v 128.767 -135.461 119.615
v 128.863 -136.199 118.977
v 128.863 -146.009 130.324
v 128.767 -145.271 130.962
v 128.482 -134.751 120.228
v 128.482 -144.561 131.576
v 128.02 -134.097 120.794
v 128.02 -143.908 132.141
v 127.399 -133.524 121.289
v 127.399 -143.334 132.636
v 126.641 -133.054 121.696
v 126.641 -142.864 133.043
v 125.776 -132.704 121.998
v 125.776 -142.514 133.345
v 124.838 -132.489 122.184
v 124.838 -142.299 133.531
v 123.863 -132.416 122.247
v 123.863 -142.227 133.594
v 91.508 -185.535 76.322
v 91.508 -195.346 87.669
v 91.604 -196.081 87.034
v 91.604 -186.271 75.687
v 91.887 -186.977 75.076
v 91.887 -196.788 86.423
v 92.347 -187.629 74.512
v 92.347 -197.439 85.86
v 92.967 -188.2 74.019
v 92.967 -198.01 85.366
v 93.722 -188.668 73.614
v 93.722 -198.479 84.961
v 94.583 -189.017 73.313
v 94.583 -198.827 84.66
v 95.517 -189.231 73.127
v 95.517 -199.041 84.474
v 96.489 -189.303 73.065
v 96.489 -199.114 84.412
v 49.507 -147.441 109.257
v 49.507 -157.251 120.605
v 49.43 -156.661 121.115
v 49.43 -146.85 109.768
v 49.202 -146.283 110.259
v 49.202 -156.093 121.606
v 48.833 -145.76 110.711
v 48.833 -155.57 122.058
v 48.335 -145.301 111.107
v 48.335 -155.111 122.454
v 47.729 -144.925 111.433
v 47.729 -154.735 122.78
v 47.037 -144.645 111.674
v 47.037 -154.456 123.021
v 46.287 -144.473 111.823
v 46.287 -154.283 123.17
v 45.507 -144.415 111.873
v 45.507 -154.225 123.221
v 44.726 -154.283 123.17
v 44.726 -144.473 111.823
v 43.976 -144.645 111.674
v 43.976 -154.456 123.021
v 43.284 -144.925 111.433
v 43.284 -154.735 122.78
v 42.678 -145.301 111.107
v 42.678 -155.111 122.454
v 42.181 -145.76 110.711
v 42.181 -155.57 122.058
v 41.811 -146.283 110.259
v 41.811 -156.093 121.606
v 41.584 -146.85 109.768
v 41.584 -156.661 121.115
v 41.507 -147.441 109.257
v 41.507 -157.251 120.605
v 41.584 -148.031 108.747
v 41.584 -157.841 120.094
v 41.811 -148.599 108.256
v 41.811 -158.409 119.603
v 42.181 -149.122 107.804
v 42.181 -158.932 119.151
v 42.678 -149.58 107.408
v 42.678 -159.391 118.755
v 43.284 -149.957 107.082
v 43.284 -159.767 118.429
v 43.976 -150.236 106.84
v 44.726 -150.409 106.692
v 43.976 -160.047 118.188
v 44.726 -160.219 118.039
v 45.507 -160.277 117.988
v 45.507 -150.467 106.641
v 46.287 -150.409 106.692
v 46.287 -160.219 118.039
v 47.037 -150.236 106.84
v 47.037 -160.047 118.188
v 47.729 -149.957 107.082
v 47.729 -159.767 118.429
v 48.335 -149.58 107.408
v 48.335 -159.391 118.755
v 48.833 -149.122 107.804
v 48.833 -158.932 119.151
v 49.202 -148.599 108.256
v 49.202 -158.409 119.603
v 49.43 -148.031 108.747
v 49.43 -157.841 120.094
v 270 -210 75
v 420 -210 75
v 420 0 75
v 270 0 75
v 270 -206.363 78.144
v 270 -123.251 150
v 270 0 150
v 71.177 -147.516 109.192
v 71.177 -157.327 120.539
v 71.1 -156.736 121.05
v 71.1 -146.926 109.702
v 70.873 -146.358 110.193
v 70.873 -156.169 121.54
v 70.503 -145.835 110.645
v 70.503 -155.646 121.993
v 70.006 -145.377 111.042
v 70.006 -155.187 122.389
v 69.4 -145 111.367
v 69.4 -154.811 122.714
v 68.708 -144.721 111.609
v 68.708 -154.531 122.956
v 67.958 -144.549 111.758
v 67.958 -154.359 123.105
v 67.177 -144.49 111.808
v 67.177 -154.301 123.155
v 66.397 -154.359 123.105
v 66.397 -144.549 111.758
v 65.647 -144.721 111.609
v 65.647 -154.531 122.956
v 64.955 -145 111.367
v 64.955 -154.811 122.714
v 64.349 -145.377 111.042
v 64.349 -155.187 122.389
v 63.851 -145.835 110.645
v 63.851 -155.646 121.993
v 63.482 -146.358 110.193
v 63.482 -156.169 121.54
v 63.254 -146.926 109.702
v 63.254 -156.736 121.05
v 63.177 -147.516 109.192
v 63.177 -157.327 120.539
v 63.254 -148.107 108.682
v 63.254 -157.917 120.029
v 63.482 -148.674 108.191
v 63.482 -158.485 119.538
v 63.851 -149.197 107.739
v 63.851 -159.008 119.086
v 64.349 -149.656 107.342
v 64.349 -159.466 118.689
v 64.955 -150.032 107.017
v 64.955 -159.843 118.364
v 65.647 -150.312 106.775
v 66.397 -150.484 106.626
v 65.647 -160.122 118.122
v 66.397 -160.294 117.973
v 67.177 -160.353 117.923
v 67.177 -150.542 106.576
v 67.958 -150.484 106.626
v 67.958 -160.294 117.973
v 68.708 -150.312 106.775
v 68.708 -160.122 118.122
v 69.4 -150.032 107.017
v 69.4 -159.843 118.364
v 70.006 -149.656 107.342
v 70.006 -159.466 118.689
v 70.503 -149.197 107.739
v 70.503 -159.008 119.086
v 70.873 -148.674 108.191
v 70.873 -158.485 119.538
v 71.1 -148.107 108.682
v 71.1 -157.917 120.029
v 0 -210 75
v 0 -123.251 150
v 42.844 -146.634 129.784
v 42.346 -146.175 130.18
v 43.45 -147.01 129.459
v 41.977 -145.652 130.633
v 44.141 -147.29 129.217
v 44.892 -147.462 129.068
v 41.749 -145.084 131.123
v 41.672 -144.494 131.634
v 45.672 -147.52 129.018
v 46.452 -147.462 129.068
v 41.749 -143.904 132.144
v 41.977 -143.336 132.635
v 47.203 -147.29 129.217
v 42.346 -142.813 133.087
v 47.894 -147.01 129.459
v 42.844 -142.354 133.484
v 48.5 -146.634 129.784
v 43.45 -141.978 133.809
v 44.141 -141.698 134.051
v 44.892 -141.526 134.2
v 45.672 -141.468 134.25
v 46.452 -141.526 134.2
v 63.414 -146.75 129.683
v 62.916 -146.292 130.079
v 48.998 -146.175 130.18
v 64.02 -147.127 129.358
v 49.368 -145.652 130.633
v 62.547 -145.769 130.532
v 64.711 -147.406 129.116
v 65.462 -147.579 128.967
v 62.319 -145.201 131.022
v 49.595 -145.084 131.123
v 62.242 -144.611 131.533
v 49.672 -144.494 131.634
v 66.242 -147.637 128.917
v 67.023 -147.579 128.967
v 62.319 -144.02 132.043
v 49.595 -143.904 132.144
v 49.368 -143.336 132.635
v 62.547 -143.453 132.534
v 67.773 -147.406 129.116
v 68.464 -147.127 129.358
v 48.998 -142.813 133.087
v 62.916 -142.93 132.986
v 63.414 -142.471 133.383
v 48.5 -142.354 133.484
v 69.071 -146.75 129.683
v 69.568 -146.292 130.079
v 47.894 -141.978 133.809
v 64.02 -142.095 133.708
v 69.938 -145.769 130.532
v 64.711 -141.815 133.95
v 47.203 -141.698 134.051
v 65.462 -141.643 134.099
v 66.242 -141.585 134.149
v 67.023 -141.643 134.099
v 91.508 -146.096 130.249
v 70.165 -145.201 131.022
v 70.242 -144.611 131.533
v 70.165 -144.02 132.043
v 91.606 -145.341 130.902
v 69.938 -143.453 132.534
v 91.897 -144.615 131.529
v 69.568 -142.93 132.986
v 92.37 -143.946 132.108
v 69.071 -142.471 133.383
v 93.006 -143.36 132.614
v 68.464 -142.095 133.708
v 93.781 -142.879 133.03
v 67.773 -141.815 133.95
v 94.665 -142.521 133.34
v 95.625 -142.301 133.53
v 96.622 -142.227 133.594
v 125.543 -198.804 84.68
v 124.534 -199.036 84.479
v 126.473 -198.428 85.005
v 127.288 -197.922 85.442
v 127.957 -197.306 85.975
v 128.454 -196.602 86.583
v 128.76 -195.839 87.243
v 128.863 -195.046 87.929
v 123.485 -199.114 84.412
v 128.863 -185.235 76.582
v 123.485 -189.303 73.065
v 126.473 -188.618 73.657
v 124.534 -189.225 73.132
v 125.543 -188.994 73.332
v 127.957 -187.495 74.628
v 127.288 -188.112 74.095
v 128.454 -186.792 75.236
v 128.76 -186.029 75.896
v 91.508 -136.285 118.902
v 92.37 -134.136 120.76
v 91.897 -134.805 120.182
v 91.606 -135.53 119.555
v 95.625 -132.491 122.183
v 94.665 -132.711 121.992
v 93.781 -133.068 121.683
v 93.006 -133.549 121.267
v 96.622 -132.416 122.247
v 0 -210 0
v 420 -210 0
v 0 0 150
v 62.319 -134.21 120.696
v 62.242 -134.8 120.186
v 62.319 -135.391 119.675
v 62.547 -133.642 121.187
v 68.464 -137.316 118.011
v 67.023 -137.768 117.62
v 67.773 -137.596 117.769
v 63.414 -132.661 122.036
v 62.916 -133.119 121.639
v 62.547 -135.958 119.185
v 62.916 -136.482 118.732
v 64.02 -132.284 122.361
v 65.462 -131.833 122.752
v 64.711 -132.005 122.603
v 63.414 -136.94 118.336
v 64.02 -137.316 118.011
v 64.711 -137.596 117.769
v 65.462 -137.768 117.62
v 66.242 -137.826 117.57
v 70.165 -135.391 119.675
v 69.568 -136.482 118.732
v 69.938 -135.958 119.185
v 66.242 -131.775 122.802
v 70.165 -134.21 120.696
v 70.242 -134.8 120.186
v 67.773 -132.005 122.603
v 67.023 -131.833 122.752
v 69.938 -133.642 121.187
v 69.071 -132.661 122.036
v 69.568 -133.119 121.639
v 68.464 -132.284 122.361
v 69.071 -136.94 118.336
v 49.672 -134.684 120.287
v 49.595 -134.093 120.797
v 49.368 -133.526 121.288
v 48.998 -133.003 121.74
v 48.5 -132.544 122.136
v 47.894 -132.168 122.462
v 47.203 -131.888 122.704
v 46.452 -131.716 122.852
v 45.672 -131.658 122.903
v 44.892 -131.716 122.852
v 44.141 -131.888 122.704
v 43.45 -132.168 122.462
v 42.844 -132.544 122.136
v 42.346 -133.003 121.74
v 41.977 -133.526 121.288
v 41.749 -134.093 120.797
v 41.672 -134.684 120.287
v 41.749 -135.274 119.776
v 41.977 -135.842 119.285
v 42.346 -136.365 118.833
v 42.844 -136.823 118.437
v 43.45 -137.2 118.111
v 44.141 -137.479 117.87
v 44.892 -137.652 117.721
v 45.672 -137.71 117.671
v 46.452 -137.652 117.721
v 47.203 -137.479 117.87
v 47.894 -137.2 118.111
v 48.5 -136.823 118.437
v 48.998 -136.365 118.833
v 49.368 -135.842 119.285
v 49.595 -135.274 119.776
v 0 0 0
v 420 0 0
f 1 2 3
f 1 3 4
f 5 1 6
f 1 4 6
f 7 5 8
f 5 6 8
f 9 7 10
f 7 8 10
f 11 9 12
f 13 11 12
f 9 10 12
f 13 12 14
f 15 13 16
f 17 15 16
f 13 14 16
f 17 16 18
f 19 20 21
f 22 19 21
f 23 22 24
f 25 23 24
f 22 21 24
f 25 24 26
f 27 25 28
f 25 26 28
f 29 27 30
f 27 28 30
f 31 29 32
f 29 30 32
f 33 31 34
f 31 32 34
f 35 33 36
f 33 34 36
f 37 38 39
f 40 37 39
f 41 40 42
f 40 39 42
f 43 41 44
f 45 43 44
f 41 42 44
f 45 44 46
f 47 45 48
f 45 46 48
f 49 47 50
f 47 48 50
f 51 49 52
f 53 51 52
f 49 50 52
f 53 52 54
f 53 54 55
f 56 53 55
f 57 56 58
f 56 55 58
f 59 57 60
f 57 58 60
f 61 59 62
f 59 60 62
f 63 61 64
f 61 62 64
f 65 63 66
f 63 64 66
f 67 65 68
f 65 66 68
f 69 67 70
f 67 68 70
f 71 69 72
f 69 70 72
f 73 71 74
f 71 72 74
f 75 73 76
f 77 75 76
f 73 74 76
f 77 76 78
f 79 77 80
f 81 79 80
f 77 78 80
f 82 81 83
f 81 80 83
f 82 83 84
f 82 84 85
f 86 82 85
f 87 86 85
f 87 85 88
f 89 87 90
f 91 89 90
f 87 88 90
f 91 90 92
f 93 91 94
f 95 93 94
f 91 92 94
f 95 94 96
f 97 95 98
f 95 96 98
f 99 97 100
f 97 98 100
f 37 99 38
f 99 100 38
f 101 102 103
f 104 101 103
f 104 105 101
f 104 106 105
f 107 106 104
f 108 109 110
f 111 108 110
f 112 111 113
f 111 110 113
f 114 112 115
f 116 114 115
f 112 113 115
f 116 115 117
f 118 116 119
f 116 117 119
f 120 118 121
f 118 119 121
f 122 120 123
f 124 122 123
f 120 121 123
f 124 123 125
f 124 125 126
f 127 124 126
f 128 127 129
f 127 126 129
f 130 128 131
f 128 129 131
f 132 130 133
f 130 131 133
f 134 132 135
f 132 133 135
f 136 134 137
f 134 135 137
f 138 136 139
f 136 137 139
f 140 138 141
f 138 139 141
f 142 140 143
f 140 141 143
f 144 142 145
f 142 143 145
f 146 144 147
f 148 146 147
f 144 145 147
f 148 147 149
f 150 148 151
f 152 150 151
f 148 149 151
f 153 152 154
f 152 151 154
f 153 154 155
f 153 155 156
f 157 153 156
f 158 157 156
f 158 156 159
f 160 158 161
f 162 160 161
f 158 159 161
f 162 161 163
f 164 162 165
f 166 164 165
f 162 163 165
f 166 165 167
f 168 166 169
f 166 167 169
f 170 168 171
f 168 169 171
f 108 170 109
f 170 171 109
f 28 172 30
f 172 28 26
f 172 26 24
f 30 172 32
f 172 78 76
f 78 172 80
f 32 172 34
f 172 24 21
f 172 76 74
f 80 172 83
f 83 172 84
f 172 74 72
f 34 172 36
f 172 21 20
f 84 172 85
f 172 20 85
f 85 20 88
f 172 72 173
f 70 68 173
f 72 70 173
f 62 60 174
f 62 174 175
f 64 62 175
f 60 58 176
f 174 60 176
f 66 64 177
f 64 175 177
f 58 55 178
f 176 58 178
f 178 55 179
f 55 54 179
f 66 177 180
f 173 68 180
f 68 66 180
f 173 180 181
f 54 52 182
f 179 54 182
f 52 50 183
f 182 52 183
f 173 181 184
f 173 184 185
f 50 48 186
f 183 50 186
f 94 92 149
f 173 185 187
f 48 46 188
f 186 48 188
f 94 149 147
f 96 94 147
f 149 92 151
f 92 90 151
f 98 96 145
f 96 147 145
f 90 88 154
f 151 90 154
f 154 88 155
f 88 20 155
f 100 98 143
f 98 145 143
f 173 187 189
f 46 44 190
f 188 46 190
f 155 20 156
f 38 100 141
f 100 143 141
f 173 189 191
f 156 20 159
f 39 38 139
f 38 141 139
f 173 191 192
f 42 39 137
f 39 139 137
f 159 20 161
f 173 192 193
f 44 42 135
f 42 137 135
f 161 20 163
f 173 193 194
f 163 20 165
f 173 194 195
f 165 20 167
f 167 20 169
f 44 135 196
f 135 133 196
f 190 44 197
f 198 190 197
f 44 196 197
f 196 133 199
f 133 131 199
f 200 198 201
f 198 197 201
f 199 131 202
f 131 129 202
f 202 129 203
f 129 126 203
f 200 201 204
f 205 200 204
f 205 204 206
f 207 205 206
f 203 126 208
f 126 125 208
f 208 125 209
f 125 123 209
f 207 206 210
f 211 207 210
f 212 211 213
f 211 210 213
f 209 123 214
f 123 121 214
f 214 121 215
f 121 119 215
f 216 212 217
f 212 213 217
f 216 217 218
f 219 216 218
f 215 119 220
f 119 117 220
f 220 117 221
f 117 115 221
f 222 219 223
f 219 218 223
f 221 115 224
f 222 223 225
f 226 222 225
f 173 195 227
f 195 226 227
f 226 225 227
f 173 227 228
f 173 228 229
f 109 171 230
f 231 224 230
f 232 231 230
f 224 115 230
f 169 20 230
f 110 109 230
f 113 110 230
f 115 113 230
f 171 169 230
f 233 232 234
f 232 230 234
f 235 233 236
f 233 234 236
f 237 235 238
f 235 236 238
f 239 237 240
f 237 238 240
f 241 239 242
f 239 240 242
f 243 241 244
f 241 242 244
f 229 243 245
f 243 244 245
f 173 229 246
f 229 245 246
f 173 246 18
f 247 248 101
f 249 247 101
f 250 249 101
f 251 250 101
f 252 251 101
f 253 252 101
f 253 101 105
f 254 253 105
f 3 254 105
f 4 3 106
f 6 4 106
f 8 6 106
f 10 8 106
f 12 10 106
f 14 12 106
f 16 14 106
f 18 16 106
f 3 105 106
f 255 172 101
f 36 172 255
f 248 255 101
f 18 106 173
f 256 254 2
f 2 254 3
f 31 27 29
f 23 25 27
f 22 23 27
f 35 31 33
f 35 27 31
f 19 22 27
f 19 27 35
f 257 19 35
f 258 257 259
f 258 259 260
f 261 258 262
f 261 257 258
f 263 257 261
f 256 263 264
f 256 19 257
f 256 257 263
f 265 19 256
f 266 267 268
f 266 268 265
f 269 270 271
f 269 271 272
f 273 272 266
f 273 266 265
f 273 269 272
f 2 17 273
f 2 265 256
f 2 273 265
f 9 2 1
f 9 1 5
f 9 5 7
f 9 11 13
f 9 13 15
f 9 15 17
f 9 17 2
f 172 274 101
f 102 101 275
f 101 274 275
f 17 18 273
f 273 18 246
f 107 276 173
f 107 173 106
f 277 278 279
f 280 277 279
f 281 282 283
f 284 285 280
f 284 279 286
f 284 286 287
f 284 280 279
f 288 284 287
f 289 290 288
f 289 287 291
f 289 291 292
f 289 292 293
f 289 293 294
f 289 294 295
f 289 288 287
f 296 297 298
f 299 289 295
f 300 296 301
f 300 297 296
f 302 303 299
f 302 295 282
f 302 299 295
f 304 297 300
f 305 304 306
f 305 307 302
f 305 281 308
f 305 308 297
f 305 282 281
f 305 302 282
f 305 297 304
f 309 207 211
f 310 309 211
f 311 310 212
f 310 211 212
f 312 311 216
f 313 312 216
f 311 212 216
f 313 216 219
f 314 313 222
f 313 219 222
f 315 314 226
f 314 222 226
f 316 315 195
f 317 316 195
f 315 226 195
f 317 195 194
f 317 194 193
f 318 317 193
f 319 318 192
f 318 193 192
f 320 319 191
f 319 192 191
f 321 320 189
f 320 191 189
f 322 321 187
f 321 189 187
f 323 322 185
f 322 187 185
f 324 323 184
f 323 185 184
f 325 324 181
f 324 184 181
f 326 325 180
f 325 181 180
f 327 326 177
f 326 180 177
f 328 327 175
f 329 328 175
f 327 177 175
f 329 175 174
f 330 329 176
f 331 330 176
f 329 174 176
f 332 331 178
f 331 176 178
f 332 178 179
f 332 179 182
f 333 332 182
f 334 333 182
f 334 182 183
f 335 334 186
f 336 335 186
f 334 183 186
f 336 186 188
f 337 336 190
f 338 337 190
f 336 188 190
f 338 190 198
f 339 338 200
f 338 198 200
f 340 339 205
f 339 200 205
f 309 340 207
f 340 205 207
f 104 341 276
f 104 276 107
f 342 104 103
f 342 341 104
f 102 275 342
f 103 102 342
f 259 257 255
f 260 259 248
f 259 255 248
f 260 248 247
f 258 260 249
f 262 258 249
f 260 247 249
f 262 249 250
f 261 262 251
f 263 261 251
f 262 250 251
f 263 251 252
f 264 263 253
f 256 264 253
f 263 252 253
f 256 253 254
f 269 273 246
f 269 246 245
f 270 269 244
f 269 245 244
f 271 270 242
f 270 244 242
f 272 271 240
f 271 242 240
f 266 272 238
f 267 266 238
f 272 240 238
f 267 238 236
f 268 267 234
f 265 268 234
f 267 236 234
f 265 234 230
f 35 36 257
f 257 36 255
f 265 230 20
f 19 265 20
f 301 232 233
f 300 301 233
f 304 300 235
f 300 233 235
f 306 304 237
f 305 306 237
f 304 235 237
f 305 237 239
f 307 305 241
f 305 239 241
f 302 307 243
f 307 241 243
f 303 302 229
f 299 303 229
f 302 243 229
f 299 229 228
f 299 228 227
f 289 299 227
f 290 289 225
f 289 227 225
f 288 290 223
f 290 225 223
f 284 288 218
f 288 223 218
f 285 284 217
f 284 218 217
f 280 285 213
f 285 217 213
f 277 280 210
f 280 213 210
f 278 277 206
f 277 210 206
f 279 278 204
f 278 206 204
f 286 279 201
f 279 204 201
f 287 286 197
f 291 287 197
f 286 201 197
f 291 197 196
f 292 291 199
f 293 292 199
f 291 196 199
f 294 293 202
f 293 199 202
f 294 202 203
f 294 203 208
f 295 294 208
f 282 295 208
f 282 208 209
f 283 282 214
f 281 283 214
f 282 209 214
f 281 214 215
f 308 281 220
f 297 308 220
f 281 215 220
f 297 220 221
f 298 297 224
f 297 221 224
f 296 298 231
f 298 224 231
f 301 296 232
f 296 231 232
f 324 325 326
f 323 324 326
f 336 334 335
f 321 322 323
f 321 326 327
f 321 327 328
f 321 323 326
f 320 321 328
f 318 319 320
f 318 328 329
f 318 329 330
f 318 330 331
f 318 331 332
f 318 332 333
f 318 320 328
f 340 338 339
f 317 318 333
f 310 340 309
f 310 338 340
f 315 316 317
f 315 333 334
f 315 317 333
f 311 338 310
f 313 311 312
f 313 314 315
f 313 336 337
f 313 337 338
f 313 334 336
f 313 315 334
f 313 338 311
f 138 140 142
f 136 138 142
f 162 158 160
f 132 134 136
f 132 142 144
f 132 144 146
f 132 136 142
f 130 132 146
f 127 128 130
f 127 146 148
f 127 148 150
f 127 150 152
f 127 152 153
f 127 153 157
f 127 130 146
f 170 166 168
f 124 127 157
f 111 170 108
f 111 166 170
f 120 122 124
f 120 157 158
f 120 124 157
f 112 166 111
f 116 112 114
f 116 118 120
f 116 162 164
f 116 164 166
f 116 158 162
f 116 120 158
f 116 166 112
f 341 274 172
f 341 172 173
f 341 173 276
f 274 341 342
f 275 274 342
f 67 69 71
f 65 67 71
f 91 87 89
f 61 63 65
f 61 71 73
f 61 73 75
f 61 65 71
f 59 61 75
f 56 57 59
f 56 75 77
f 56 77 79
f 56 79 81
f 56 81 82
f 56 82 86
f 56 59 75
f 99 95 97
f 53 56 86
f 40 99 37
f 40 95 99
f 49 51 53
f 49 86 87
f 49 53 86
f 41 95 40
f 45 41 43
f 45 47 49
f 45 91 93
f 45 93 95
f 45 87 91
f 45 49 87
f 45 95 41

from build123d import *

# Parameters (mm, degrees)
F0_W     = 420
F0_H     = 210
F1_DEPTH = 150
F3_DEPTH = 420.001
F4_R     = 4
F5_DEPTH = 15
F7_DEPTH = 150


with BuildPart() as f1:
    # F0 (on Top) → F1 (new body)
    with BuildSketch(Plane.XY):
        with Locations((210, -105)):
            Rectangle(F0_W, F0_H)
    extrude(amount=F1_DEPTH)

    # F2 (on face) → F3 (cut, through all)
    with BuildSketch(Plane.YZ.offset(420)):
        Polygon((-210, 150), (-210, 75), (-123.2505664229, 150), align=None)
    extrude(amount=-F3_DEPTH, mode=Mode.SUBTRACT)

    # F4 (on face) → F5 (cut)
    with BuildSketch(Plane(origin=(0, -126.9320637805, 146.8171284764), x_dir=(1, 0, 0), z_dir=(0, -0.6540195362, 0.7564776575))):
        with Locations((45.6720627844, -23.2154857367)):
            Circle(F4_R)
        with Locations((66.2421623061, -23.3697257936)):
            Circle(F4_R)
        with Locations((67.1772722169, -40.1790748625)):
            Circle(F4_R)
        with Locations((45.5067284684, -40.0792160809)):
            Circle(F4_R)
        with BuildLine():
            Line((123.8630712032, -20.2180277556), (96.6224558651, -20.2180277556))
            ThreePointArc((96.6224558651, -20.2180277556), (93.0059849426, -21.7160190597), (91.5079936385, -25.3324899822))
            Line((91.5079936385, -25.3324899822), (91.5079936385, -90.4371738434))
            ThreePointArc((91.5079936385, -90.4371738434), (92.9668696589, -93.9592121177), (96.4889079332, -95.4180881381))
            Line((96.4889079332, -95.4180881381), (123.4852224588, -95.4180881381))
            ThreePointArc((123.4852224588, -95.4180881381), (127.2878428404, -93.8429912035), (128.862939775, -90.040370822))
            Line((128.862939775, -90.040370822), (128.862939775, -25.2178963274))
            ThreePointArc((128.862939775, -25.2178963274), (127.3985121754, -21.6824553552), (123.8630712032, -20.2180277556))
        make_face()
    extrude(amount=-F5_DEPTH, mode=Mode.SUBTRACT)

    # F6 (on face) → F7 (cut)
    with BuildSketch(Plane.YZ.offset(420)):
        Polygon((-206.3629985005, 78.1444022308), (-210, 75), (0, 75), (0, 150), (-123.2505664229, 150), align=None)
    extrude(amount=-F7_DEPTH, mode=Mode.SUBTRACT)


solid = f1.part
